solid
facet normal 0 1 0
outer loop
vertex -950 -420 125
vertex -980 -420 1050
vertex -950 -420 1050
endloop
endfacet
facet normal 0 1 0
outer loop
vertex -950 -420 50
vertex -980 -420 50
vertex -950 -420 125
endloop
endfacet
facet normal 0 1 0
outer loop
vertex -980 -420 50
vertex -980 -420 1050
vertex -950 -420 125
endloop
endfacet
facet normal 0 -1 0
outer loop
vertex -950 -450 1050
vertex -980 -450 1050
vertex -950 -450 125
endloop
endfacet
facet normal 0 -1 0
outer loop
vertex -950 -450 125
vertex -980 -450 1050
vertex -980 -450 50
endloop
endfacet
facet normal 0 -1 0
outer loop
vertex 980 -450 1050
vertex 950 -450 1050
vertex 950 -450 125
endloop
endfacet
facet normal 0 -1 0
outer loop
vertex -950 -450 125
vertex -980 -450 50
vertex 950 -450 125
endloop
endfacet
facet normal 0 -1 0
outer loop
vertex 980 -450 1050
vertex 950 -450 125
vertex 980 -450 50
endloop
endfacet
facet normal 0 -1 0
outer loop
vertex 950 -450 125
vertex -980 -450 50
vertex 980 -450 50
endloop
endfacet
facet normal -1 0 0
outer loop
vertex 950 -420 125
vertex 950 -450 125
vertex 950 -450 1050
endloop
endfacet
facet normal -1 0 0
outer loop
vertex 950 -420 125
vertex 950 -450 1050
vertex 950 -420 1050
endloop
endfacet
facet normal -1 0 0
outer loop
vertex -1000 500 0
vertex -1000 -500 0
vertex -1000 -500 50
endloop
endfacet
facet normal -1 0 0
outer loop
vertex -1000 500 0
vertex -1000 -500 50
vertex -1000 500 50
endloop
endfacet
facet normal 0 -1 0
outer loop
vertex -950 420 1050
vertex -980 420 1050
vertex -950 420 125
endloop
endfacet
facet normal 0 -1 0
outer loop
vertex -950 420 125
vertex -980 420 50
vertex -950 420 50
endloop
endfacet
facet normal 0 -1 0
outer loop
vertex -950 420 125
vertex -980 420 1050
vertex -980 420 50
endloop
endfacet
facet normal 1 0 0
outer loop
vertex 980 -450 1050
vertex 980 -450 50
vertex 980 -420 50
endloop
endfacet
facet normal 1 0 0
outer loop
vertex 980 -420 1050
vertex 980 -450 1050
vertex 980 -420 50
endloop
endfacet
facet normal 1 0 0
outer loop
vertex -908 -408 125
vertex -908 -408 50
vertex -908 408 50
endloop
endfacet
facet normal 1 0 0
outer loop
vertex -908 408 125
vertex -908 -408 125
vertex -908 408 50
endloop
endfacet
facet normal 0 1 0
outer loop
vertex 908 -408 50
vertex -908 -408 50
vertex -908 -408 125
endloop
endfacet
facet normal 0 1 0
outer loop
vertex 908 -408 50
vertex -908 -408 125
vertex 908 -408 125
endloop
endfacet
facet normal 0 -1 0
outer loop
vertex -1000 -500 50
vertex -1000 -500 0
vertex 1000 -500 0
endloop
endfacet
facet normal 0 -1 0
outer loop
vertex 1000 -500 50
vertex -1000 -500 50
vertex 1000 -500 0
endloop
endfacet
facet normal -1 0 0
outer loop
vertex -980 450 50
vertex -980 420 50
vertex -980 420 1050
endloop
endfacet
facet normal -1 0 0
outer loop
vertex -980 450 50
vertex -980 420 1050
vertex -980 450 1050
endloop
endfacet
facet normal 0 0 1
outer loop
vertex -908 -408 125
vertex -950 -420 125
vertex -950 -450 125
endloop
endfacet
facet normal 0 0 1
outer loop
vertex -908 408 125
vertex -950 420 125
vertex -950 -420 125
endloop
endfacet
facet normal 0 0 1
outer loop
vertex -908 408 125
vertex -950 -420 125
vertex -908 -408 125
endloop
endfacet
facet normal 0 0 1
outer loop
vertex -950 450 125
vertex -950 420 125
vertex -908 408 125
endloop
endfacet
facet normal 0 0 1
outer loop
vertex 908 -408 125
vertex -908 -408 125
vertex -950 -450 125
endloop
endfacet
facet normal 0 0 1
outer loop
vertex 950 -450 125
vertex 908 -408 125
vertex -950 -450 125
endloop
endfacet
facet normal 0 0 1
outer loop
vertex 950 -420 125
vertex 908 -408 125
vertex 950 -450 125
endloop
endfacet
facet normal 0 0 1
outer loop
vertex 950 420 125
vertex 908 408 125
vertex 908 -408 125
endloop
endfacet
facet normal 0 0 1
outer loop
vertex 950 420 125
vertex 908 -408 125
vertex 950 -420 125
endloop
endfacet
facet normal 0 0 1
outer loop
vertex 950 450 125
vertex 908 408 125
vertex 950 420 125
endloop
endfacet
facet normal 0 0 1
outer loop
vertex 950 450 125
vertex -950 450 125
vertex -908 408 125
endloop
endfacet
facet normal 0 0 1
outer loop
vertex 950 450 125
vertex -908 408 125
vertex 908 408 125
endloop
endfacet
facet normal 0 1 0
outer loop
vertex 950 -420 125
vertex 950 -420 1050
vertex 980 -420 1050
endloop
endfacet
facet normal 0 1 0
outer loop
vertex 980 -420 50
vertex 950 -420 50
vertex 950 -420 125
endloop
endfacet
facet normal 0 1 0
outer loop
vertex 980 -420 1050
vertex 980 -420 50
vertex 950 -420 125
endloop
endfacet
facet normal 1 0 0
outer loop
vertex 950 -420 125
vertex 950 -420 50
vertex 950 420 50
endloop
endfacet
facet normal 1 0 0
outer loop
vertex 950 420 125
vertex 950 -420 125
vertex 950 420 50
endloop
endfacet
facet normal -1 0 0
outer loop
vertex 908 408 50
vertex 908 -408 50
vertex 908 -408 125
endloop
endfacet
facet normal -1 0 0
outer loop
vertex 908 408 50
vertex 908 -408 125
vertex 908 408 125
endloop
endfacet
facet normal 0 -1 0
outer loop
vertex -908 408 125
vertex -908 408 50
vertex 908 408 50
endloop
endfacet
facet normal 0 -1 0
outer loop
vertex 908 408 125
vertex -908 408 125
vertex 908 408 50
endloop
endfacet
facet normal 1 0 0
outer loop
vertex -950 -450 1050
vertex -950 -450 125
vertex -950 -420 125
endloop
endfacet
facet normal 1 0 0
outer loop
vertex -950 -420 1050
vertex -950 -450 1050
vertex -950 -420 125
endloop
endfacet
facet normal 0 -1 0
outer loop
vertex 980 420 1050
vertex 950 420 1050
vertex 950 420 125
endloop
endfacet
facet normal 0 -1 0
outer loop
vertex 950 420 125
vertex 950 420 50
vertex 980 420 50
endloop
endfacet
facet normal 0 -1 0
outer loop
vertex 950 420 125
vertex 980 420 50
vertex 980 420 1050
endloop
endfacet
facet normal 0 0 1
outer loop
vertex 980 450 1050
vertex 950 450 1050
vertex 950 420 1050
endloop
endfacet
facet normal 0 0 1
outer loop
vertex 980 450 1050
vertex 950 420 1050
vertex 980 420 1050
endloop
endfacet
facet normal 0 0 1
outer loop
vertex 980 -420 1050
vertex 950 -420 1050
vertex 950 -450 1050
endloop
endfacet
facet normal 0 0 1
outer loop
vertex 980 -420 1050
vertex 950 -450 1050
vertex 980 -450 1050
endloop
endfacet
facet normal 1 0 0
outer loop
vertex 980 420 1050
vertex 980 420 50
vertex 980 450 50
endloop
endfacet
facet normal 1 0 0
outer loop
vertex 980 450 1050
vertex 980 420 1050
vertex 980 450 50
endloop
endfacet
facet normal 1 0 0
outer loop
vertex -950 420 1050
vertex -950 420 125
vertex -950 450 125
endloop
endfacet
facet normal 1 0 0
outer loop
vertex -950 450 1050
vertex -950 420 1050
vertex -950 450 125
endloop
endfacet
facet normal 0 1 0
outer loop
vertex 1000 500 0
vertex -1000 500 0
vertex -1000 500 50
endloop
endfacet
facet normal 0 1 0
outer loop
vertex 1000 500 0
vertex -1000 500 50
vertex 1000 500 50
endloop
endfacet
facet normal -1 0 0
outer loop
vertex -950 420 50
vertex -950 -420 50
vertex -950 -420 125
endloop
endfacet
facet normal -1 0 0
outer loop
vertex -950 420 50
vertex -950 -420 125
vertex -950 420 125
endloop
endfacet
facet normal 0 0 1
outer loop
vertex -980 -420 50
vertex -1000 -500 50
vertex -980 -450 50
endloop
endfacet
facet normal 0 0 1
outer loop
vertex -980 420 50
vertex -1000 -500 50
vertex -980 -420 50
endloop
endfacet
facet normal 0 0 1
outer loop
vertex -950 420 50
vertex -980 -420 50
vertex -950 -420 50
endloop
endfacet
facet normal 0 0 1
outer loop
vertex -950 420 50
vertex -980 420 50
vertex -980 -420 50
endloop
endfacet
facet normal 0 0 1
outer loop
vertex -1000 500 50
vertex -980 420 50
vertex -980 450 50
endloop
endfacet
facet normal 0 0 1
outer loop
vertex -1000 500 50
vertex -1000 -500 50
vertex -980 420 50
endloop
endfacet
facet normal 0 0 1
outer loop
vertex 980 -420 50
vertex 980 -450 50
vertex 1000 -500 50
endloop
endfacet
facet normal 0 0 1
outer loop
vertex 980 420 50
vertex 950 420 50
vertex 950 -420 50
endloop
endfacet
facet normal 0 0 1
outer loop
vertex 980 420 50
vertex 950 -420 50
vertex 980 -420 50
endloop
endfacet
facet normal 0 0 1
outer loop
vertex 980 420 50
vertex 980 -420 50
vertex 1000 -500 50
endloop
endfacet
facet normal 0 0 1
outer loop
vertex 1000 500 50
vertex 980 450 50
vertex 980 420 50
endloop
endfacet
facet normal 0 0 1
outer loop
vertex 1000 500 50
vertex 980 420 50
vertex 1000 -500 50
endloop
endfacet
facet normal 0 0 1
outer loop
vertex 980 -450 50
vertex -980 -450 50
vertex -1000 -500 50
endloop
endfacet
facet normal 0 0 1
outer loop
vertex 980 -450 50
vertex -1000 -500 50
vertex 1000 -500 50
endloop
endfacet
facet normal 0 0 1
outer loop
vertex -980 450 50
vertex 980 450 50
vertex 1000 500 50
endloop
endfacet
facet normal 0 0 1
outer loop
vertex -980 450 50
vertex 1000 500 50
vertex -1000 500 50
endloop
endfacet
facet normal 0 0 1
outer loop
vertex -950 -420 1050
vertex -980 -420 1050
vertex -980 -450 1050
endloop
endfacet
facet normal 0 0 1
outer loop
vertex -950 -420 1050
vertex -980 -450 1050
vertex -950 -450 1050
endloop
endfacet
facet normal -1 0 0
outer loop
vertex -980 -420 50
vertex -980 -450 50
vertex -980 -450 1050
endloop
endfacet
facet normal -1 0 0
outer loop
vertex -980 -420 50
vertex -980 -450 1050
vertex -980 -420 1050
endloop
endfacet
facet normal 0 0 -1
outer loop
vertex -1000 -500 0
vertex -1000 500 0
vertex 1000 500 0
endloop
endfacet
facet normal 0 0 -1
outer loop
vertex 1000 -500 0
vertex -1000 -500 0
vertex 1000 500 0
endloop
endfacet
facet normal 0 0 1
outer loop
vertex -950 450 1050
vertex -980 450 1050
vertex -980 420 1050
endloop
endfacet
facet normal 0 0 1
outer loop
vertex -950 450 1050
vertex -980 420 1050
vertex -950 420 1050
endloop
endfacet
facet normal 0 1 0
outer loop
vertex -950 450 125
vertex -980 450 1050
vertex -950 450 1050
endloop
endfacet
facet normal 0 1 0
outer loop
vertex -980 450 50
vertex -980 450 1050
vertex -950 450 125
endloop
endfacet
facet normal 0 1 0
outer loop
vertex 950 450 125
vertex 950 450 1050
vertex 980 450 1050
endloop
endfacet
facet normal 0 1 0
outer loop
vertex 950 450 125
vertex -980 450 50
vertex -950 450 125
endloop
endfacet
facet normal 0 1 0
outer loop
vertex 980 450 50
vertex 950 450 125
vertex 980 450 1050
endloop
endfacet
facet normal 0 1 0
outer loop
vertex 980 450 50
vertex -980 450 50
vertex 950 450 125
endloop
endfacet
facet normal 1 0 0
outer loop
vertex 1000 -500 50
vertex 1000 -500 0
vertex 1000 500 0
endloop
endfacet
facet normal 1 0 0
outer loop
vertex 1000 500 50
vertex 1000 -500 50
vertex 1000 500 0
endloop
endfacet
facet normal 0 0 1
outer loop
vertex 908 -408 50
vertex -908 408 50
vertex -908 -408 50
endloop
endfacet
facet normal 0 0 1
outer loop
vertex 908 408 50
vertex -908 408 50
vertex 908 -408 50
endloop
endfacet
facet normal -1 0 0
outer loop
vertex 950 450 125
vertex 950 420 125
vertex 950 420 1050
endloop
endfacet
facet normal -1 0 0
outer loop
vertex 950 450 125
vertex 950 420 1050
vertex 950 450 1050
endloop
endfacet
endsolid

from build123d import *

# Parameters (mm, degrees)
ESQUISSE1_W        = 2000
ESQUISSE1_H        = 1000
BOSS_EXTRU_1_DEPTH = 50
ESQUISSE2_W        = 1900
ESQUISSE2_H        = 900
ESQUISSE2_W_2      = 1816
ESQUISSE2_H_2      = 816
BOSS_EXTRU_2_DEPTH = 75
ESQUISSE3_W        = 30
ESQUISSE3_H        = 30
BOSS_EXTRU_3_DEPTH = 1000


with BuildPart() as part:
    # Esquisse1 → Boss.-Extru.1 (new body)
    with BuildSketch(Plane.XY):
        Rectangle(ESQUISSE1_W, ESQUISSE1_H)
    extrude(amount=BOSS_EXTRU_1_DEPTH)

    # Esquisse2 → Boss.-Extru.2 (add)
    with BuildSketch(Plane.XY.offset(50)):
        Rectangle(ESQUISSE2_W, ESQUISSE2_H)
        Rectangle(ESQUISSE2_W_2, ESQUISSE2_H_2, mode=Mode.SUBTRACT)
    extrude(amount=BOSS_EXTRU_2_DEPTH)

    # Esquisse3 → Boss.-Extru.3 (add)
    with BuildSketch(Plane.XY.offset(50)):
        with Locations((-965, 435)):
            Rectangle(ESQUISSE3_W, ESQUISSE3_H)
        with Locations((965, 435)):
            Rectangle(ESQUISSE3_W, ESQUISSE3_H)
        with Locations((965, -435)):
            Rectangle(ESQUISSE3_W, ESQUISSE3_H)
        with Locations((-965, -435)):
            Rectangle(ESQUISSE3_W, ESQUISSE3_H)
    extrude(amount=BOSS_EXTRU_3_DEPTH)


solid = part.part
